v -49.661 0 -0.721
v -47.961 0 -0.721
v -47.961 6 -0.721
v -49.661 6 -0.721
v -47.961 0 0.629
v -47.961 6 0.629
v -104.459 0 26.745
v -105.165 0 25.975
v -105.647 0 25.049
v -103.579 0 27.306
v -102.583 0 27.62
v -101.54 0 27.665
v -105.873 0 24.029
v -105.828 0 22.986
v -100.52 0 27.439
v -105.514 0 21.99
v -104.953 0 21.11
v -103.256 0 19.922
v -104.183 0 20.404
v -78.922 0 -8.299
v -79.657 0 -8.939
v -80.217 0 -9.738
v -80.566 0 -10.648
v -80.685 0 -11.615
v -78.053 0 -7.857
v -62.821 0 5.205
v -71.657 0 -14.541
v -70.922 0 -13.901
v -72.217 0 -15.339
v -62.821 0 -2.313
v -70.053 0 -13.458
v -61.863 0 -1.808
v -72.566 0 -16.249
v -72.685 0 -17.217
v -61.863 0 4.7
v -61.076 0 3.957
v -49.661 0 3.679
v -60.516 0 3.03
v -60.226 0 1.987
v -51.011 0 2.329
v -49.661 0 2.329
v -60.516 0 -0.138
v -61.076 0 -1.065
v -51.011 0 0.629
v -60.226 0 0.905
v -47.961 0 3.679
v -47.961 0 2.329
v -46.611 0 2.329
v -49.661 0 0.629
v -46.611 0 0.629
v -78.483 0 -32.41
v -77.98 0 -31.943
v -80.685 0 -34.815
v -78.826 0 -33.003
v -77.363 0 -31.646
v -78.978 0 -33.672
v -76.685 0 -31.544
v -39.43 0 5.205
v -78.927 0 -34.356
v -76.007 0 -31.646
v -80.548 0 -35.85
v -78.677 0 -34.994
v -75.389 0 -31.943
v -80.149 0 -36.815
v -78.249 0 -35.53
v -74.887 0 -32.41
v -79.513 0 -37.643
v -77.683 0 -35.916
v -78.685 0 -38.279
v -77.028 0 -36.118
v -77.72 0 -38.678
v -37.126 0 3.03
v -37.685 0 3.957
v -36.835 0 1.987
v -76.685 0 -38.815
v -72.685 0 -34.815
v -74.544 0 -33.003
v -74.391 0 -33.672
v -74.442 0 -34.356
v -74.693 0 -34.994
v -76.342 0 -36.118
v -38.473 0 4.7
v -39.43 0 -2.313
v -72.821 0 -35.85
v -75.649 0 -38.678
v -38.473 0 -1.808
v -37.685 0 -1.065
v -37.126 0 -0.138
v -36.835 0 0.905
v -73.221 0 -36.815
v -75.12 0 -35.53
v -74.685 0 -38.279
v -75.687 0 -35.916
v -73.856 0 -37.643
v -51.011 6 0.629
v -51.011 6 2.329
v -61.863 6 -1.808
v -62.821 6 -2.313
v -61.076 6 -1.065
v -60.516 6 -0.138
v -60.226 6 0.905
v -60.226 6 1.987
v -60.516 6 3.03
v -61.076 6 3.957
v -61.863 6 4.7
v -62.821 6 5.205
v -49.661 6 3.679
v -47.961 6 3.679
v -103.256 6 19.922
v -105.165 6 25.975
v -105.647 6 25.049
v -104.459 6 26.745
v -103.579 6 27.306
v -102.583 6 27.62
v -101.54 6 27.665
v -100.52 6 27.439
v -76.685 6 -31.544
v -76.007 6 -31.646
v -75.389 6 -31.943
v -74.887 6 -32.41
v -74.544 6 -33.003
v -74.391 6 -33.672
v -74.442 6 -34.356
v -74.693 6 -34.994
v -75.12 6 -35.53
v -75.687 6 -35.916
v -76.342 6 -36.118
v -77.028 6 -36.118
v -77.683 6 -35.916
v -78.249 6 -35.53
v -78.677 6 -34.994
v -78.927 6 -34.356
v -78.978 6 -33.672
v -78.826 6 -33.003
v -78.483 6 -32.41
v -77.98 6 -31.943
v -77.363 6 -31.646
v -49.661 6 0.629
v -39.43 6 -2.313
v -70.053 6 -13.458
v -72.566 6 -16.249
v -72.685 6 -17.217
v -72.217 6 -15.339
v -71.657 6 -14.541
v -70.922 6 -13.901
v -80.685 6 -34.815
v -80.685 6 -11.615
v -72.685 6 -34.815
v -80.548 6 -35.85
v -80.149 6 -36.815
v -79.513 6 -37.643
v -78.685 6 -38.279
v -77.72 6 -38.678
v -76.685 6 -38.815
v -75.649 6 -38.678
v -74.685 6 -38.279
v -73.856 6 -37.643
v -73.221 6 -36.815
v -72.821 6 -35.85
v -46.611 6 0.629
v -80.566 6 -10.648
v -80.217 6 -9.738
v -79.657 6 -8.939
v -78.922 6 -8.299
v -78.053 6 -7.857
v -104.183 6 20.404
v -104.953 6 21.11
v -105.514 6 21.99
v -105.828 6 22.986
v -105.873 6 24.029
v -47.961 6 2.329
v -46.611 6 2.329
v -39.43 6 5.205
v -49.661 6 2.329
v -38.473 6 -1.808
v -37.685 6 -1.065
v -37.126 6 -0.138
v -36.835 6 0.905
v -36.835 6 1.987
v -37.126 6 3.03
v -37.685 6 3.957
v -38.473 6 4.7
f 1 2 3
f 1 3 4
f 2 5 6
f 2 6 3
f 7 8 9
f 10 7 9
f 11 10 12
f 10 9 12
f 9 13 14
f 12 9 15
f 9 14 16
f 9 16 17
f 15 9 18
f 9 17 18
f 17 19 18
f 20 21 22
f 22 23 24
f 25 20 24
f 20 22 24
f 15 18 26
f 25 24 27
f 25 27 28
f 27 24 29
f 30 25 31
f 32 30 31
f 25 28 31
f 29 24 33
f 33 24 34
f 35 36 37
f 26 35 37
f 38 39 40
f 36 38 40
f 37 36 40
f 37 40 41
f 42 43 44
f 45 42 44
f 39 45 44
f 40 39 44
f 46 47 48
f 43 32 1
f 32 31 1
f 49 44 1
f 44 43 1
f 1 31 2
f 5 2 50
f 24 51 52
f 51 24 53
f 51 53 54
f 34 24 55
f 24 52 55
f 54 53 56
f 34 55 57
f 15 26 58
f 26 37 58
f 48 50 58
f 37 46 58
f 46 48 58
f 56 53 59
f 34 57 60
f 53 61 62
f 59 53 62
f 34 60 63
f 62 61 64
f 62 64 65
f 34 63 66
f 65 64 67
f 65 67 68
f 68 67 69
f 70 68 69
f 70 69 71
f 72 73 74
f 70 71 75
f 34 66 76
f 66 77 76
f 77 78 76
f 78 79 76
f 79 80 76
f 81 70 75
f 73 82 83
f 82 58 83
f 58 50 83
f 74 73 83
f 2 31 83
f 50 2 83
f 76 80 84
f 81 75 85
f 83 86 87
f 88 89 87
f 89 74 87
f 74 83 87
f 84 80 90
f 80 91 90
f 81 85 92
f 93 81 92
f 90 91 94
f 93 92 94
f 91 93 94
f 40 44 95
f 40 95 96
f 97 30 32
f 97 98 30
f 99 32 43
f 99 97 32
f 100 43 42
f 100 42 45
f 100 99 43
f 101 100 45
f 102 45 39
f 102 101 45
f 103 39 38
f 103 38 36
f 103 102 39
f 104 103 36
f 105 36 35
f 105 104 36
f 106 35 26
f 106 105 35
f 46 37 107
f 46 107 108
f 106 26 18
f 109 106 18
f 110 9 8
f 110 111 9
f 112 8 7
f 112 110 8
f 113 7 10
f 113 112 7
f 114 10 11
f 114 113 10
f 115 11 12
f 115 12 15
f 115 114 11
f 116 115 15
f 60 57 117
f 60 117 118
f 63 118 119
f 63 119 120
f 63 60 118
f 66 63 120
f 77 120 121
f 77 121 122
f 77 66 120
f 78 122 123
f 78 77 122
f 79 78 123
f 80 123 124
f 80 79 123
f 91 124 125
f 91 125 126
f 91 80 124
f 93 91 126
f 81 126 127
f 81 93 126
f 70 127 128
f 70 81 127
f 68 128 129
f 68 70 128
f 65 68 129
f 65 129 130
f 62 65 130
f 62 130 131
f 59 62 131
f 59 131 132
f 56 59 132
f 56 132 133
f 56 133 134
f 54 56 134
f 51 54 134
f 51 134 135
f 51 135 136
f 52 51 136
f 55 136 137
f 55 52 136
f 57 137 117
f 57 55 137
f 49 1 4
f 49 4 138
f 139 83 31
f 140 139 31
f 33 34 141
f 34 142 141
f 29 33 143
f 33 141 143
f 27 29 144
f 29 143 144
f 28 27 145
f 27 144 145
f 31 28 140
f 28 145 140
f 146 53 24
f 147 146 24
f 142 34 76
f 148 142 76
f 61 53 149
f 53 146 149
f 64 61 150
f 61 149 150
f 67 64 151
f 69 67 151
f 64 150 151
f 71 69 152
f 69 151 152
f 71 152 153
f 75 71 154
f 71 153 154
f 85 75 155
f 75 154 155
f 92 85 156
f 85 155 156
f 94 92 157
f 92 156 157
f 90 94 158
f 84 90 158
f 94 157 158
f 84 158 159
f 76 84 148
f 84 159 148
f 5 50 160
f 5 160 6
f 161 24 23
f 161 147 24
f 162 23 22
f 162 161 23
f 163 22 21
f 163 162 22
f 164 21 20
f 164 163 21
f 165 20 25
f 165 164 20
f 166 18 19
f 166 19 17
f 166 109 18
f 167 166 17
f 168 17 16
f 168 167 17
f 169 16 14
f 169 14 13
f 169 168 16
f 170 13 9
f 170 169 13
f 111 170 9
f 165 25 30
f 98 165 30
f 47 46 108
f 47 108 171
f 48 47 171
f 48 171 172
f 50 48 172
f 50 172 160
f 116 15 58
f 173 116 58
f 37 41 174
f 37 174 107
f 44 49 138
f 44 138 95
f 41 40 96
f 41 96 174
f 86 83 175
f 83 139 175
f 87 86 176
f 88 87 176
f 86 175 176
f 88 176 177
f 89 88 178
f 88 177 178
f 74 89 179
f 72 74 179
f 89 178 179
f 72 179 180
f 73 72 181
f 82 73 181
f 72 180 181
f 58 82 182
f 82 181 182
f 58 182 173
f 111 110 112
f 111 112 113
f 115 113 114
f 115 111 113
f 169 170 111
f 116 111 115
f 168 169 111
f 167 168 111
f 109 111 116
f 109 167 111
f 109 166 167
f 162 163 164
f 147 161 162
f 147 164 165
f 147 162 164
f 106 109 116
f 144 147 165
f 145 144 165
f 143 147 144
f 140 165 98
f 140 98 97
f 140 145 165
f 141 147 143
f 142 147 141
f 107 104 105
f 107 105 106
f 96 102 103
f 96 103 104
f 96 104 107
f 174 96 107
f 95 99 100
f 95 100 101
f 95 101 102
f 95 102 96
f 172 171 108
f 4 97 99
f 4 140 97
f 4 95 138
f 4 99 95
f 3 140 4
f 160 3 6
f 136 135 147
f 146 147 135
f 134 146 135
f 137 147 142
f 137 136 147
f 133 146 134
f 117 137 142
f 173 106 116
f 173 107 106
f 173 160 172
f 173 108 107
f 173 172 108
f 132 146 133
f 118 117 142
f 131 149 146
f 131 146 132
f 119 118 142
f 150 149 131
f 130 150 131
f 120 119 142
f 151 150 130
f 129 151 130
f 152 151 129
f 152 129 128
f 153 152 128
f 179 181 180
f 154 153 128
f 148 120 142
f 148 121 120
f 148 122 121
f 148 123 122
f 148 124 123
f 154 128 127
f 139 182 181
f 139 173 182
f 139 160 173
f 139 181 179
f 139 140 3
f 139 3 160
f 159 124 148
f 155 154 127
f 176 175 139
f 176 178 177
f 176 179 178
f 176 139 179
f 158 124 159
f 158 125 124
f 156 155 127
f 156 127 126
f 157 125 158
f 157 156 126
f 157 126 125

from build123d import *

# Parameters (mm, degrees)
SKETCH1_R           = 2.3
BOSS_EXTRUDE1_DEPTH = 6
FILLET1_R           = 4


with BuildPart() as part:
    # Sketch1 → Boss-Extrude1 (new body)
    with BuildSketch(Plane(origin=(0, 0, 0), x_dir=(1, 0, 0), z_dir=(0, 1, 0))):
        Polygon((-80.684780516, 38.81470852), (-80.684780516, 8.81470852), (-52.494001892, -1.44589578), (-107.0151375, -21.289966279), (-104.278976354, -28.807507246), (-29.103566691, -1.44589578), (-72.684780516, 14.416368826), (-72.684780516, 38.81470852), align=None)
        with Locations(Location((-76.684780516, 33.843739542, 0), (0, 0, 270))):
            Circle(SKETCH1_R, mode=Mode.SUBTRACT)
        Polygon((-51.010936087, -0.6288713), (-51.010936087, -2.3288713), (-49.660936087, -2.3288713), (-49.660936087, -3.6788713), (-47.960936087, -3.6788713), (-47.960936087, -2.3288713), (-46.610936087, -2.3288713), (-46.610936087, -0.6288713), (-47.960936087, -0.6288713), (-47.960936087, 0.7211287), (-49.660936087, 0.7211287), (-49.660936087, -0.6288713), align=None, mode=Mode.SUBTRACT)
    extrude(amount=BOSS_EXTRUDE1_DEPTH)

    # Fillet1
    fillet1_edges = [part.edges().sort_by_distance(p)[0] for p in [
        (-72.684780516, 3, -14.416368826),
        (-80.684780516, 3, -8.81470852),
        (-104.278976354, 3, 28.807507246),
        (-107.0151375, 3, 21.289966279),
        (-52.494001892, 3, 1.44589578),
        (-29.103566691, 3, 1.44589578),
        (-72.684780516, 3, -38.81470852),
        (-80.684780516, 3, -38.81470852),
    ]]
    fillet(fillet1_edges, radius=FILLET1_R - 0.0001)  # a hair under: the kernel refuses the full size


solid = part.part
